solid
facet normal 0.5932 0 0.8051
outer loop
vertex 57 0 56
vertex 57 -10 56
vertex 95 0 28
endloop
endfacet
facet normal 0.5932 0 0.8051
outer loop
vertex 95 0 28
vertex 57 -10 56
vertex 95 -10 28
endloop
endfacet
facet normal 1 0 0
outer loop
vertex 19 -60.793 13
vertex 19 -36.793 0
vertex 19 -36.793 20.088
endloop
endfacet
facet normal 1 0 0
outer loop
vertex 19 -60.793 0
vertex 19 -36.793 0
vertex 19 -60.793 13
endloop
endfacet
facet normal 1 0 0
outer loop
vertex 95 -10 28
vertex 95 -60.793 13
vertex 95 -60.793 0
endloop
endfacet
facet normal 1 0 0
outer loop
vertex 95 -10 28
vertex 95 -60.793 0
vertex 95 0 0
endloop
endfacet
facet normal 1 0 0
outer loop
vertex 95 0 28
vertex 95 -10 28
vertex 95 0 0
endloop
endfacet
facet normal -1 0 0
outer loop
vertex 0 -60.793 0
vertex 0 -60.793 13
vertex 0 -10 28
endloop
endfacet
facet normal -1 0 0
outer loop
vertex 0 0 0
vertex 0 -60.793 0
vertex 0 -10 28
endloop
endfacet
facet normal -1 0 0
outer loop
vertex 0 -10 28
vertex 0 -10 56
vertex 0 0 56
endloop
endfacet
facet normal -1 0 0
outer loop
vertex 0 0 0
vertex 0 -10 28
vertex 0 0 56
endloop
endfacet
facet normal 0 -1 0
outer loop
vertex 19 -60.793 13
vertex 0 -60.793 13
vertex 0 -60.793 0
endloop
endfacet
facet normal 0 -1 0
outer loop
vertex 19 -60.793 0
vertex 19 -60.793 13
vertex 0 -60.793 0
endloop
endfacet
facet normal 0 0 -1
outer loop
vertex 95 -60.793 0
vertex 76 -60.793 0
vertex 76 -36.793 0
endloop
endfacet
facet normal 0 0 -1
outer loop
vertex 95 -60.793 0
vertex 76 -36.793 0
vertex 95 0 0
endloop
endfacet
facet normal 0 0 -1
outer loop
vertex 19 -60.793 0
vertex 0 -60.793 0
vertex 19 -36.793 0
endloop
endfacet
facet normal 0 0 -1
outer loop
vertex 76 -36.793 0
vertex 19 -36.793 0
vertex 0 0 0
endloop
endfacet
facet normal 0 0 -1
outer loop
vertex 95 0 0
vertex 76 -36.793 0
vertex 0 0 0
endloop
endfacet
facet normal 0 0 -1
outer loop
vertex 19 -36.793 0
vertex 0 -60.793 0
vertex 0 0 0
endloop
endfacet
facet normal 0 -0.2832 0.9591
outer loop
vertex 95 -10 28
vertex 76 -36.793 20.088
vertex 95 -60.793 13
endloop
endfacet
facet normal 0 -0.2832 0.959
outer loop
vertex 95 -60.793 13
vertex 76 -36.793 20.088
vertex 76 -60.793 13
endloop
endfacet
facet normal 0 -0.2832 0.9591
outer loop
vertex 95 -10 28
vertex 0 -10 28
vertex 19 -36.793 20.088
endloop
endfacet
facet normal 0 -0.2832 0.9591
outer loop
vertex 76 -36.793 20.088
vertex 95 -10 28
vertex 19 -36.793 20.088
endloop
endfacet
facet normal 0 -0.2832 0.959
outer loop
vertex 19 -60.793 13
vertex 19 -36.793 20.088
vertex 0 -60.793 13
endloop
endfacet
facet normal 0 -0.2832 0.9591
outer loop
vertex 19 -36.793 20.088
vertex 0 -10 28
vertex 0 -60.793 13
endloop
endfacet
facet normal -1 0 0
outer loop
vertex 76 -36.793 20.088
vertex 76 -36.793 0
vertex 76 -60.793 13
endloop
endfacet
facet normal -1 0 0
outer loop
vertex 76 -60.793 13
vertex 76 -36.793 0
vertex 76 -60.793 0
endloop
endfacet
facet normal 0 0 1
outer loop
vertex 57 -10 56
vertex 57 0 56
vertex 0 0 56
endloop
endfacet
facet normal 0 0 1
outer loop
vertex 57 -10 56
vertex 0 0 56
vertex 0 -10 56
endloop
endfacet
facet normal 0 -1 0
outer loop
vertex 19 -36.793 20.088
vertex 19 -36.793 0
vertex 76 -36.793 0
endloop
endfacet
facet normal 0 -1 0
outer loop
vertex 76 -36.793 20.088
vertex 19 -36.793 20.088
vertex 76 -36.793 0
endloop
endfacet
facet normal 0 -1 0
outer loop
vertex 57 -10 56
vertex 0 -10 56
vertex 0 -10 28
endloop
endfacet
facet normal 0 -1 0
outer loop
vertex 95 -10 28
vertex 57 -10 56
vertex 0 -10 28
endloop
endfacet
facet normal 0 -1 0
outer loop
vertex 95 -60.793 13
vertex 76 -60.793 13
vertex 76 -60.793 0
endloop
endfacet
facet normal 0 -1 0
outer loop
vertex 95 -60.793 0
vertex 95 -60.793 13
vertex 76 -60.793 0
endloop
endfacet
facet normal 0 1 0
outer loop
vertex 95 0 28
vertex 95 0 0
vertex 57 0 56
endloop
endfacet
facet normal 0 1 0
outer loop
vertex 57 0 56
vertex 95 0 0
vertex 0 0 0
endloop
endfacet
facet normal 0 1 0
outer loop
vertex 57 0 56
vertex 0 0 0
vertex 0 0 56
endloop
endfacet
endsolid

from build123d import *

# Parameters (mm, degrees)
F1_DEPTH = 95
F3_DEPTH = 10
F4_W     = 57
F4_H     = 24
F5_DEPTH = 55.8


with BuildPart() as f1:
    # F0 (on Right) → F1 (new body)
    with BuildSketch(Plane.YZ):
        Polygon((0, 56), (-10, 56), (-10, 28), (-60.793455, 13), (-60.793455, 0), (-10, 0), (0, 0), (0, 28), align=None)
    extrude(amount=F1_DEPTH)

    # F2 (on face) → F3 (cut, through all)
    with BuildSketch(Plane.XZ.offset(10)):
        Polygon((95, 56), (57, 56), (95, 28), align=None)
    extrude(amount=-F3_DEPTH, mode=Mode.SUBTRACT)

    # F4 (on face) → F5 (cut)
    with BuildSketch(Plane(origin=(0, 0, 0), x_dir=(1, 0, 0), z_dir=(0, 0, -1))):
        with Locations((47.5, 48.793455)):
            Rectangle(F4_W, F4_H)
    extrude(amount=-F5_DEPTH, mode=Mode.SUBTRACT)


solid = f1.part
